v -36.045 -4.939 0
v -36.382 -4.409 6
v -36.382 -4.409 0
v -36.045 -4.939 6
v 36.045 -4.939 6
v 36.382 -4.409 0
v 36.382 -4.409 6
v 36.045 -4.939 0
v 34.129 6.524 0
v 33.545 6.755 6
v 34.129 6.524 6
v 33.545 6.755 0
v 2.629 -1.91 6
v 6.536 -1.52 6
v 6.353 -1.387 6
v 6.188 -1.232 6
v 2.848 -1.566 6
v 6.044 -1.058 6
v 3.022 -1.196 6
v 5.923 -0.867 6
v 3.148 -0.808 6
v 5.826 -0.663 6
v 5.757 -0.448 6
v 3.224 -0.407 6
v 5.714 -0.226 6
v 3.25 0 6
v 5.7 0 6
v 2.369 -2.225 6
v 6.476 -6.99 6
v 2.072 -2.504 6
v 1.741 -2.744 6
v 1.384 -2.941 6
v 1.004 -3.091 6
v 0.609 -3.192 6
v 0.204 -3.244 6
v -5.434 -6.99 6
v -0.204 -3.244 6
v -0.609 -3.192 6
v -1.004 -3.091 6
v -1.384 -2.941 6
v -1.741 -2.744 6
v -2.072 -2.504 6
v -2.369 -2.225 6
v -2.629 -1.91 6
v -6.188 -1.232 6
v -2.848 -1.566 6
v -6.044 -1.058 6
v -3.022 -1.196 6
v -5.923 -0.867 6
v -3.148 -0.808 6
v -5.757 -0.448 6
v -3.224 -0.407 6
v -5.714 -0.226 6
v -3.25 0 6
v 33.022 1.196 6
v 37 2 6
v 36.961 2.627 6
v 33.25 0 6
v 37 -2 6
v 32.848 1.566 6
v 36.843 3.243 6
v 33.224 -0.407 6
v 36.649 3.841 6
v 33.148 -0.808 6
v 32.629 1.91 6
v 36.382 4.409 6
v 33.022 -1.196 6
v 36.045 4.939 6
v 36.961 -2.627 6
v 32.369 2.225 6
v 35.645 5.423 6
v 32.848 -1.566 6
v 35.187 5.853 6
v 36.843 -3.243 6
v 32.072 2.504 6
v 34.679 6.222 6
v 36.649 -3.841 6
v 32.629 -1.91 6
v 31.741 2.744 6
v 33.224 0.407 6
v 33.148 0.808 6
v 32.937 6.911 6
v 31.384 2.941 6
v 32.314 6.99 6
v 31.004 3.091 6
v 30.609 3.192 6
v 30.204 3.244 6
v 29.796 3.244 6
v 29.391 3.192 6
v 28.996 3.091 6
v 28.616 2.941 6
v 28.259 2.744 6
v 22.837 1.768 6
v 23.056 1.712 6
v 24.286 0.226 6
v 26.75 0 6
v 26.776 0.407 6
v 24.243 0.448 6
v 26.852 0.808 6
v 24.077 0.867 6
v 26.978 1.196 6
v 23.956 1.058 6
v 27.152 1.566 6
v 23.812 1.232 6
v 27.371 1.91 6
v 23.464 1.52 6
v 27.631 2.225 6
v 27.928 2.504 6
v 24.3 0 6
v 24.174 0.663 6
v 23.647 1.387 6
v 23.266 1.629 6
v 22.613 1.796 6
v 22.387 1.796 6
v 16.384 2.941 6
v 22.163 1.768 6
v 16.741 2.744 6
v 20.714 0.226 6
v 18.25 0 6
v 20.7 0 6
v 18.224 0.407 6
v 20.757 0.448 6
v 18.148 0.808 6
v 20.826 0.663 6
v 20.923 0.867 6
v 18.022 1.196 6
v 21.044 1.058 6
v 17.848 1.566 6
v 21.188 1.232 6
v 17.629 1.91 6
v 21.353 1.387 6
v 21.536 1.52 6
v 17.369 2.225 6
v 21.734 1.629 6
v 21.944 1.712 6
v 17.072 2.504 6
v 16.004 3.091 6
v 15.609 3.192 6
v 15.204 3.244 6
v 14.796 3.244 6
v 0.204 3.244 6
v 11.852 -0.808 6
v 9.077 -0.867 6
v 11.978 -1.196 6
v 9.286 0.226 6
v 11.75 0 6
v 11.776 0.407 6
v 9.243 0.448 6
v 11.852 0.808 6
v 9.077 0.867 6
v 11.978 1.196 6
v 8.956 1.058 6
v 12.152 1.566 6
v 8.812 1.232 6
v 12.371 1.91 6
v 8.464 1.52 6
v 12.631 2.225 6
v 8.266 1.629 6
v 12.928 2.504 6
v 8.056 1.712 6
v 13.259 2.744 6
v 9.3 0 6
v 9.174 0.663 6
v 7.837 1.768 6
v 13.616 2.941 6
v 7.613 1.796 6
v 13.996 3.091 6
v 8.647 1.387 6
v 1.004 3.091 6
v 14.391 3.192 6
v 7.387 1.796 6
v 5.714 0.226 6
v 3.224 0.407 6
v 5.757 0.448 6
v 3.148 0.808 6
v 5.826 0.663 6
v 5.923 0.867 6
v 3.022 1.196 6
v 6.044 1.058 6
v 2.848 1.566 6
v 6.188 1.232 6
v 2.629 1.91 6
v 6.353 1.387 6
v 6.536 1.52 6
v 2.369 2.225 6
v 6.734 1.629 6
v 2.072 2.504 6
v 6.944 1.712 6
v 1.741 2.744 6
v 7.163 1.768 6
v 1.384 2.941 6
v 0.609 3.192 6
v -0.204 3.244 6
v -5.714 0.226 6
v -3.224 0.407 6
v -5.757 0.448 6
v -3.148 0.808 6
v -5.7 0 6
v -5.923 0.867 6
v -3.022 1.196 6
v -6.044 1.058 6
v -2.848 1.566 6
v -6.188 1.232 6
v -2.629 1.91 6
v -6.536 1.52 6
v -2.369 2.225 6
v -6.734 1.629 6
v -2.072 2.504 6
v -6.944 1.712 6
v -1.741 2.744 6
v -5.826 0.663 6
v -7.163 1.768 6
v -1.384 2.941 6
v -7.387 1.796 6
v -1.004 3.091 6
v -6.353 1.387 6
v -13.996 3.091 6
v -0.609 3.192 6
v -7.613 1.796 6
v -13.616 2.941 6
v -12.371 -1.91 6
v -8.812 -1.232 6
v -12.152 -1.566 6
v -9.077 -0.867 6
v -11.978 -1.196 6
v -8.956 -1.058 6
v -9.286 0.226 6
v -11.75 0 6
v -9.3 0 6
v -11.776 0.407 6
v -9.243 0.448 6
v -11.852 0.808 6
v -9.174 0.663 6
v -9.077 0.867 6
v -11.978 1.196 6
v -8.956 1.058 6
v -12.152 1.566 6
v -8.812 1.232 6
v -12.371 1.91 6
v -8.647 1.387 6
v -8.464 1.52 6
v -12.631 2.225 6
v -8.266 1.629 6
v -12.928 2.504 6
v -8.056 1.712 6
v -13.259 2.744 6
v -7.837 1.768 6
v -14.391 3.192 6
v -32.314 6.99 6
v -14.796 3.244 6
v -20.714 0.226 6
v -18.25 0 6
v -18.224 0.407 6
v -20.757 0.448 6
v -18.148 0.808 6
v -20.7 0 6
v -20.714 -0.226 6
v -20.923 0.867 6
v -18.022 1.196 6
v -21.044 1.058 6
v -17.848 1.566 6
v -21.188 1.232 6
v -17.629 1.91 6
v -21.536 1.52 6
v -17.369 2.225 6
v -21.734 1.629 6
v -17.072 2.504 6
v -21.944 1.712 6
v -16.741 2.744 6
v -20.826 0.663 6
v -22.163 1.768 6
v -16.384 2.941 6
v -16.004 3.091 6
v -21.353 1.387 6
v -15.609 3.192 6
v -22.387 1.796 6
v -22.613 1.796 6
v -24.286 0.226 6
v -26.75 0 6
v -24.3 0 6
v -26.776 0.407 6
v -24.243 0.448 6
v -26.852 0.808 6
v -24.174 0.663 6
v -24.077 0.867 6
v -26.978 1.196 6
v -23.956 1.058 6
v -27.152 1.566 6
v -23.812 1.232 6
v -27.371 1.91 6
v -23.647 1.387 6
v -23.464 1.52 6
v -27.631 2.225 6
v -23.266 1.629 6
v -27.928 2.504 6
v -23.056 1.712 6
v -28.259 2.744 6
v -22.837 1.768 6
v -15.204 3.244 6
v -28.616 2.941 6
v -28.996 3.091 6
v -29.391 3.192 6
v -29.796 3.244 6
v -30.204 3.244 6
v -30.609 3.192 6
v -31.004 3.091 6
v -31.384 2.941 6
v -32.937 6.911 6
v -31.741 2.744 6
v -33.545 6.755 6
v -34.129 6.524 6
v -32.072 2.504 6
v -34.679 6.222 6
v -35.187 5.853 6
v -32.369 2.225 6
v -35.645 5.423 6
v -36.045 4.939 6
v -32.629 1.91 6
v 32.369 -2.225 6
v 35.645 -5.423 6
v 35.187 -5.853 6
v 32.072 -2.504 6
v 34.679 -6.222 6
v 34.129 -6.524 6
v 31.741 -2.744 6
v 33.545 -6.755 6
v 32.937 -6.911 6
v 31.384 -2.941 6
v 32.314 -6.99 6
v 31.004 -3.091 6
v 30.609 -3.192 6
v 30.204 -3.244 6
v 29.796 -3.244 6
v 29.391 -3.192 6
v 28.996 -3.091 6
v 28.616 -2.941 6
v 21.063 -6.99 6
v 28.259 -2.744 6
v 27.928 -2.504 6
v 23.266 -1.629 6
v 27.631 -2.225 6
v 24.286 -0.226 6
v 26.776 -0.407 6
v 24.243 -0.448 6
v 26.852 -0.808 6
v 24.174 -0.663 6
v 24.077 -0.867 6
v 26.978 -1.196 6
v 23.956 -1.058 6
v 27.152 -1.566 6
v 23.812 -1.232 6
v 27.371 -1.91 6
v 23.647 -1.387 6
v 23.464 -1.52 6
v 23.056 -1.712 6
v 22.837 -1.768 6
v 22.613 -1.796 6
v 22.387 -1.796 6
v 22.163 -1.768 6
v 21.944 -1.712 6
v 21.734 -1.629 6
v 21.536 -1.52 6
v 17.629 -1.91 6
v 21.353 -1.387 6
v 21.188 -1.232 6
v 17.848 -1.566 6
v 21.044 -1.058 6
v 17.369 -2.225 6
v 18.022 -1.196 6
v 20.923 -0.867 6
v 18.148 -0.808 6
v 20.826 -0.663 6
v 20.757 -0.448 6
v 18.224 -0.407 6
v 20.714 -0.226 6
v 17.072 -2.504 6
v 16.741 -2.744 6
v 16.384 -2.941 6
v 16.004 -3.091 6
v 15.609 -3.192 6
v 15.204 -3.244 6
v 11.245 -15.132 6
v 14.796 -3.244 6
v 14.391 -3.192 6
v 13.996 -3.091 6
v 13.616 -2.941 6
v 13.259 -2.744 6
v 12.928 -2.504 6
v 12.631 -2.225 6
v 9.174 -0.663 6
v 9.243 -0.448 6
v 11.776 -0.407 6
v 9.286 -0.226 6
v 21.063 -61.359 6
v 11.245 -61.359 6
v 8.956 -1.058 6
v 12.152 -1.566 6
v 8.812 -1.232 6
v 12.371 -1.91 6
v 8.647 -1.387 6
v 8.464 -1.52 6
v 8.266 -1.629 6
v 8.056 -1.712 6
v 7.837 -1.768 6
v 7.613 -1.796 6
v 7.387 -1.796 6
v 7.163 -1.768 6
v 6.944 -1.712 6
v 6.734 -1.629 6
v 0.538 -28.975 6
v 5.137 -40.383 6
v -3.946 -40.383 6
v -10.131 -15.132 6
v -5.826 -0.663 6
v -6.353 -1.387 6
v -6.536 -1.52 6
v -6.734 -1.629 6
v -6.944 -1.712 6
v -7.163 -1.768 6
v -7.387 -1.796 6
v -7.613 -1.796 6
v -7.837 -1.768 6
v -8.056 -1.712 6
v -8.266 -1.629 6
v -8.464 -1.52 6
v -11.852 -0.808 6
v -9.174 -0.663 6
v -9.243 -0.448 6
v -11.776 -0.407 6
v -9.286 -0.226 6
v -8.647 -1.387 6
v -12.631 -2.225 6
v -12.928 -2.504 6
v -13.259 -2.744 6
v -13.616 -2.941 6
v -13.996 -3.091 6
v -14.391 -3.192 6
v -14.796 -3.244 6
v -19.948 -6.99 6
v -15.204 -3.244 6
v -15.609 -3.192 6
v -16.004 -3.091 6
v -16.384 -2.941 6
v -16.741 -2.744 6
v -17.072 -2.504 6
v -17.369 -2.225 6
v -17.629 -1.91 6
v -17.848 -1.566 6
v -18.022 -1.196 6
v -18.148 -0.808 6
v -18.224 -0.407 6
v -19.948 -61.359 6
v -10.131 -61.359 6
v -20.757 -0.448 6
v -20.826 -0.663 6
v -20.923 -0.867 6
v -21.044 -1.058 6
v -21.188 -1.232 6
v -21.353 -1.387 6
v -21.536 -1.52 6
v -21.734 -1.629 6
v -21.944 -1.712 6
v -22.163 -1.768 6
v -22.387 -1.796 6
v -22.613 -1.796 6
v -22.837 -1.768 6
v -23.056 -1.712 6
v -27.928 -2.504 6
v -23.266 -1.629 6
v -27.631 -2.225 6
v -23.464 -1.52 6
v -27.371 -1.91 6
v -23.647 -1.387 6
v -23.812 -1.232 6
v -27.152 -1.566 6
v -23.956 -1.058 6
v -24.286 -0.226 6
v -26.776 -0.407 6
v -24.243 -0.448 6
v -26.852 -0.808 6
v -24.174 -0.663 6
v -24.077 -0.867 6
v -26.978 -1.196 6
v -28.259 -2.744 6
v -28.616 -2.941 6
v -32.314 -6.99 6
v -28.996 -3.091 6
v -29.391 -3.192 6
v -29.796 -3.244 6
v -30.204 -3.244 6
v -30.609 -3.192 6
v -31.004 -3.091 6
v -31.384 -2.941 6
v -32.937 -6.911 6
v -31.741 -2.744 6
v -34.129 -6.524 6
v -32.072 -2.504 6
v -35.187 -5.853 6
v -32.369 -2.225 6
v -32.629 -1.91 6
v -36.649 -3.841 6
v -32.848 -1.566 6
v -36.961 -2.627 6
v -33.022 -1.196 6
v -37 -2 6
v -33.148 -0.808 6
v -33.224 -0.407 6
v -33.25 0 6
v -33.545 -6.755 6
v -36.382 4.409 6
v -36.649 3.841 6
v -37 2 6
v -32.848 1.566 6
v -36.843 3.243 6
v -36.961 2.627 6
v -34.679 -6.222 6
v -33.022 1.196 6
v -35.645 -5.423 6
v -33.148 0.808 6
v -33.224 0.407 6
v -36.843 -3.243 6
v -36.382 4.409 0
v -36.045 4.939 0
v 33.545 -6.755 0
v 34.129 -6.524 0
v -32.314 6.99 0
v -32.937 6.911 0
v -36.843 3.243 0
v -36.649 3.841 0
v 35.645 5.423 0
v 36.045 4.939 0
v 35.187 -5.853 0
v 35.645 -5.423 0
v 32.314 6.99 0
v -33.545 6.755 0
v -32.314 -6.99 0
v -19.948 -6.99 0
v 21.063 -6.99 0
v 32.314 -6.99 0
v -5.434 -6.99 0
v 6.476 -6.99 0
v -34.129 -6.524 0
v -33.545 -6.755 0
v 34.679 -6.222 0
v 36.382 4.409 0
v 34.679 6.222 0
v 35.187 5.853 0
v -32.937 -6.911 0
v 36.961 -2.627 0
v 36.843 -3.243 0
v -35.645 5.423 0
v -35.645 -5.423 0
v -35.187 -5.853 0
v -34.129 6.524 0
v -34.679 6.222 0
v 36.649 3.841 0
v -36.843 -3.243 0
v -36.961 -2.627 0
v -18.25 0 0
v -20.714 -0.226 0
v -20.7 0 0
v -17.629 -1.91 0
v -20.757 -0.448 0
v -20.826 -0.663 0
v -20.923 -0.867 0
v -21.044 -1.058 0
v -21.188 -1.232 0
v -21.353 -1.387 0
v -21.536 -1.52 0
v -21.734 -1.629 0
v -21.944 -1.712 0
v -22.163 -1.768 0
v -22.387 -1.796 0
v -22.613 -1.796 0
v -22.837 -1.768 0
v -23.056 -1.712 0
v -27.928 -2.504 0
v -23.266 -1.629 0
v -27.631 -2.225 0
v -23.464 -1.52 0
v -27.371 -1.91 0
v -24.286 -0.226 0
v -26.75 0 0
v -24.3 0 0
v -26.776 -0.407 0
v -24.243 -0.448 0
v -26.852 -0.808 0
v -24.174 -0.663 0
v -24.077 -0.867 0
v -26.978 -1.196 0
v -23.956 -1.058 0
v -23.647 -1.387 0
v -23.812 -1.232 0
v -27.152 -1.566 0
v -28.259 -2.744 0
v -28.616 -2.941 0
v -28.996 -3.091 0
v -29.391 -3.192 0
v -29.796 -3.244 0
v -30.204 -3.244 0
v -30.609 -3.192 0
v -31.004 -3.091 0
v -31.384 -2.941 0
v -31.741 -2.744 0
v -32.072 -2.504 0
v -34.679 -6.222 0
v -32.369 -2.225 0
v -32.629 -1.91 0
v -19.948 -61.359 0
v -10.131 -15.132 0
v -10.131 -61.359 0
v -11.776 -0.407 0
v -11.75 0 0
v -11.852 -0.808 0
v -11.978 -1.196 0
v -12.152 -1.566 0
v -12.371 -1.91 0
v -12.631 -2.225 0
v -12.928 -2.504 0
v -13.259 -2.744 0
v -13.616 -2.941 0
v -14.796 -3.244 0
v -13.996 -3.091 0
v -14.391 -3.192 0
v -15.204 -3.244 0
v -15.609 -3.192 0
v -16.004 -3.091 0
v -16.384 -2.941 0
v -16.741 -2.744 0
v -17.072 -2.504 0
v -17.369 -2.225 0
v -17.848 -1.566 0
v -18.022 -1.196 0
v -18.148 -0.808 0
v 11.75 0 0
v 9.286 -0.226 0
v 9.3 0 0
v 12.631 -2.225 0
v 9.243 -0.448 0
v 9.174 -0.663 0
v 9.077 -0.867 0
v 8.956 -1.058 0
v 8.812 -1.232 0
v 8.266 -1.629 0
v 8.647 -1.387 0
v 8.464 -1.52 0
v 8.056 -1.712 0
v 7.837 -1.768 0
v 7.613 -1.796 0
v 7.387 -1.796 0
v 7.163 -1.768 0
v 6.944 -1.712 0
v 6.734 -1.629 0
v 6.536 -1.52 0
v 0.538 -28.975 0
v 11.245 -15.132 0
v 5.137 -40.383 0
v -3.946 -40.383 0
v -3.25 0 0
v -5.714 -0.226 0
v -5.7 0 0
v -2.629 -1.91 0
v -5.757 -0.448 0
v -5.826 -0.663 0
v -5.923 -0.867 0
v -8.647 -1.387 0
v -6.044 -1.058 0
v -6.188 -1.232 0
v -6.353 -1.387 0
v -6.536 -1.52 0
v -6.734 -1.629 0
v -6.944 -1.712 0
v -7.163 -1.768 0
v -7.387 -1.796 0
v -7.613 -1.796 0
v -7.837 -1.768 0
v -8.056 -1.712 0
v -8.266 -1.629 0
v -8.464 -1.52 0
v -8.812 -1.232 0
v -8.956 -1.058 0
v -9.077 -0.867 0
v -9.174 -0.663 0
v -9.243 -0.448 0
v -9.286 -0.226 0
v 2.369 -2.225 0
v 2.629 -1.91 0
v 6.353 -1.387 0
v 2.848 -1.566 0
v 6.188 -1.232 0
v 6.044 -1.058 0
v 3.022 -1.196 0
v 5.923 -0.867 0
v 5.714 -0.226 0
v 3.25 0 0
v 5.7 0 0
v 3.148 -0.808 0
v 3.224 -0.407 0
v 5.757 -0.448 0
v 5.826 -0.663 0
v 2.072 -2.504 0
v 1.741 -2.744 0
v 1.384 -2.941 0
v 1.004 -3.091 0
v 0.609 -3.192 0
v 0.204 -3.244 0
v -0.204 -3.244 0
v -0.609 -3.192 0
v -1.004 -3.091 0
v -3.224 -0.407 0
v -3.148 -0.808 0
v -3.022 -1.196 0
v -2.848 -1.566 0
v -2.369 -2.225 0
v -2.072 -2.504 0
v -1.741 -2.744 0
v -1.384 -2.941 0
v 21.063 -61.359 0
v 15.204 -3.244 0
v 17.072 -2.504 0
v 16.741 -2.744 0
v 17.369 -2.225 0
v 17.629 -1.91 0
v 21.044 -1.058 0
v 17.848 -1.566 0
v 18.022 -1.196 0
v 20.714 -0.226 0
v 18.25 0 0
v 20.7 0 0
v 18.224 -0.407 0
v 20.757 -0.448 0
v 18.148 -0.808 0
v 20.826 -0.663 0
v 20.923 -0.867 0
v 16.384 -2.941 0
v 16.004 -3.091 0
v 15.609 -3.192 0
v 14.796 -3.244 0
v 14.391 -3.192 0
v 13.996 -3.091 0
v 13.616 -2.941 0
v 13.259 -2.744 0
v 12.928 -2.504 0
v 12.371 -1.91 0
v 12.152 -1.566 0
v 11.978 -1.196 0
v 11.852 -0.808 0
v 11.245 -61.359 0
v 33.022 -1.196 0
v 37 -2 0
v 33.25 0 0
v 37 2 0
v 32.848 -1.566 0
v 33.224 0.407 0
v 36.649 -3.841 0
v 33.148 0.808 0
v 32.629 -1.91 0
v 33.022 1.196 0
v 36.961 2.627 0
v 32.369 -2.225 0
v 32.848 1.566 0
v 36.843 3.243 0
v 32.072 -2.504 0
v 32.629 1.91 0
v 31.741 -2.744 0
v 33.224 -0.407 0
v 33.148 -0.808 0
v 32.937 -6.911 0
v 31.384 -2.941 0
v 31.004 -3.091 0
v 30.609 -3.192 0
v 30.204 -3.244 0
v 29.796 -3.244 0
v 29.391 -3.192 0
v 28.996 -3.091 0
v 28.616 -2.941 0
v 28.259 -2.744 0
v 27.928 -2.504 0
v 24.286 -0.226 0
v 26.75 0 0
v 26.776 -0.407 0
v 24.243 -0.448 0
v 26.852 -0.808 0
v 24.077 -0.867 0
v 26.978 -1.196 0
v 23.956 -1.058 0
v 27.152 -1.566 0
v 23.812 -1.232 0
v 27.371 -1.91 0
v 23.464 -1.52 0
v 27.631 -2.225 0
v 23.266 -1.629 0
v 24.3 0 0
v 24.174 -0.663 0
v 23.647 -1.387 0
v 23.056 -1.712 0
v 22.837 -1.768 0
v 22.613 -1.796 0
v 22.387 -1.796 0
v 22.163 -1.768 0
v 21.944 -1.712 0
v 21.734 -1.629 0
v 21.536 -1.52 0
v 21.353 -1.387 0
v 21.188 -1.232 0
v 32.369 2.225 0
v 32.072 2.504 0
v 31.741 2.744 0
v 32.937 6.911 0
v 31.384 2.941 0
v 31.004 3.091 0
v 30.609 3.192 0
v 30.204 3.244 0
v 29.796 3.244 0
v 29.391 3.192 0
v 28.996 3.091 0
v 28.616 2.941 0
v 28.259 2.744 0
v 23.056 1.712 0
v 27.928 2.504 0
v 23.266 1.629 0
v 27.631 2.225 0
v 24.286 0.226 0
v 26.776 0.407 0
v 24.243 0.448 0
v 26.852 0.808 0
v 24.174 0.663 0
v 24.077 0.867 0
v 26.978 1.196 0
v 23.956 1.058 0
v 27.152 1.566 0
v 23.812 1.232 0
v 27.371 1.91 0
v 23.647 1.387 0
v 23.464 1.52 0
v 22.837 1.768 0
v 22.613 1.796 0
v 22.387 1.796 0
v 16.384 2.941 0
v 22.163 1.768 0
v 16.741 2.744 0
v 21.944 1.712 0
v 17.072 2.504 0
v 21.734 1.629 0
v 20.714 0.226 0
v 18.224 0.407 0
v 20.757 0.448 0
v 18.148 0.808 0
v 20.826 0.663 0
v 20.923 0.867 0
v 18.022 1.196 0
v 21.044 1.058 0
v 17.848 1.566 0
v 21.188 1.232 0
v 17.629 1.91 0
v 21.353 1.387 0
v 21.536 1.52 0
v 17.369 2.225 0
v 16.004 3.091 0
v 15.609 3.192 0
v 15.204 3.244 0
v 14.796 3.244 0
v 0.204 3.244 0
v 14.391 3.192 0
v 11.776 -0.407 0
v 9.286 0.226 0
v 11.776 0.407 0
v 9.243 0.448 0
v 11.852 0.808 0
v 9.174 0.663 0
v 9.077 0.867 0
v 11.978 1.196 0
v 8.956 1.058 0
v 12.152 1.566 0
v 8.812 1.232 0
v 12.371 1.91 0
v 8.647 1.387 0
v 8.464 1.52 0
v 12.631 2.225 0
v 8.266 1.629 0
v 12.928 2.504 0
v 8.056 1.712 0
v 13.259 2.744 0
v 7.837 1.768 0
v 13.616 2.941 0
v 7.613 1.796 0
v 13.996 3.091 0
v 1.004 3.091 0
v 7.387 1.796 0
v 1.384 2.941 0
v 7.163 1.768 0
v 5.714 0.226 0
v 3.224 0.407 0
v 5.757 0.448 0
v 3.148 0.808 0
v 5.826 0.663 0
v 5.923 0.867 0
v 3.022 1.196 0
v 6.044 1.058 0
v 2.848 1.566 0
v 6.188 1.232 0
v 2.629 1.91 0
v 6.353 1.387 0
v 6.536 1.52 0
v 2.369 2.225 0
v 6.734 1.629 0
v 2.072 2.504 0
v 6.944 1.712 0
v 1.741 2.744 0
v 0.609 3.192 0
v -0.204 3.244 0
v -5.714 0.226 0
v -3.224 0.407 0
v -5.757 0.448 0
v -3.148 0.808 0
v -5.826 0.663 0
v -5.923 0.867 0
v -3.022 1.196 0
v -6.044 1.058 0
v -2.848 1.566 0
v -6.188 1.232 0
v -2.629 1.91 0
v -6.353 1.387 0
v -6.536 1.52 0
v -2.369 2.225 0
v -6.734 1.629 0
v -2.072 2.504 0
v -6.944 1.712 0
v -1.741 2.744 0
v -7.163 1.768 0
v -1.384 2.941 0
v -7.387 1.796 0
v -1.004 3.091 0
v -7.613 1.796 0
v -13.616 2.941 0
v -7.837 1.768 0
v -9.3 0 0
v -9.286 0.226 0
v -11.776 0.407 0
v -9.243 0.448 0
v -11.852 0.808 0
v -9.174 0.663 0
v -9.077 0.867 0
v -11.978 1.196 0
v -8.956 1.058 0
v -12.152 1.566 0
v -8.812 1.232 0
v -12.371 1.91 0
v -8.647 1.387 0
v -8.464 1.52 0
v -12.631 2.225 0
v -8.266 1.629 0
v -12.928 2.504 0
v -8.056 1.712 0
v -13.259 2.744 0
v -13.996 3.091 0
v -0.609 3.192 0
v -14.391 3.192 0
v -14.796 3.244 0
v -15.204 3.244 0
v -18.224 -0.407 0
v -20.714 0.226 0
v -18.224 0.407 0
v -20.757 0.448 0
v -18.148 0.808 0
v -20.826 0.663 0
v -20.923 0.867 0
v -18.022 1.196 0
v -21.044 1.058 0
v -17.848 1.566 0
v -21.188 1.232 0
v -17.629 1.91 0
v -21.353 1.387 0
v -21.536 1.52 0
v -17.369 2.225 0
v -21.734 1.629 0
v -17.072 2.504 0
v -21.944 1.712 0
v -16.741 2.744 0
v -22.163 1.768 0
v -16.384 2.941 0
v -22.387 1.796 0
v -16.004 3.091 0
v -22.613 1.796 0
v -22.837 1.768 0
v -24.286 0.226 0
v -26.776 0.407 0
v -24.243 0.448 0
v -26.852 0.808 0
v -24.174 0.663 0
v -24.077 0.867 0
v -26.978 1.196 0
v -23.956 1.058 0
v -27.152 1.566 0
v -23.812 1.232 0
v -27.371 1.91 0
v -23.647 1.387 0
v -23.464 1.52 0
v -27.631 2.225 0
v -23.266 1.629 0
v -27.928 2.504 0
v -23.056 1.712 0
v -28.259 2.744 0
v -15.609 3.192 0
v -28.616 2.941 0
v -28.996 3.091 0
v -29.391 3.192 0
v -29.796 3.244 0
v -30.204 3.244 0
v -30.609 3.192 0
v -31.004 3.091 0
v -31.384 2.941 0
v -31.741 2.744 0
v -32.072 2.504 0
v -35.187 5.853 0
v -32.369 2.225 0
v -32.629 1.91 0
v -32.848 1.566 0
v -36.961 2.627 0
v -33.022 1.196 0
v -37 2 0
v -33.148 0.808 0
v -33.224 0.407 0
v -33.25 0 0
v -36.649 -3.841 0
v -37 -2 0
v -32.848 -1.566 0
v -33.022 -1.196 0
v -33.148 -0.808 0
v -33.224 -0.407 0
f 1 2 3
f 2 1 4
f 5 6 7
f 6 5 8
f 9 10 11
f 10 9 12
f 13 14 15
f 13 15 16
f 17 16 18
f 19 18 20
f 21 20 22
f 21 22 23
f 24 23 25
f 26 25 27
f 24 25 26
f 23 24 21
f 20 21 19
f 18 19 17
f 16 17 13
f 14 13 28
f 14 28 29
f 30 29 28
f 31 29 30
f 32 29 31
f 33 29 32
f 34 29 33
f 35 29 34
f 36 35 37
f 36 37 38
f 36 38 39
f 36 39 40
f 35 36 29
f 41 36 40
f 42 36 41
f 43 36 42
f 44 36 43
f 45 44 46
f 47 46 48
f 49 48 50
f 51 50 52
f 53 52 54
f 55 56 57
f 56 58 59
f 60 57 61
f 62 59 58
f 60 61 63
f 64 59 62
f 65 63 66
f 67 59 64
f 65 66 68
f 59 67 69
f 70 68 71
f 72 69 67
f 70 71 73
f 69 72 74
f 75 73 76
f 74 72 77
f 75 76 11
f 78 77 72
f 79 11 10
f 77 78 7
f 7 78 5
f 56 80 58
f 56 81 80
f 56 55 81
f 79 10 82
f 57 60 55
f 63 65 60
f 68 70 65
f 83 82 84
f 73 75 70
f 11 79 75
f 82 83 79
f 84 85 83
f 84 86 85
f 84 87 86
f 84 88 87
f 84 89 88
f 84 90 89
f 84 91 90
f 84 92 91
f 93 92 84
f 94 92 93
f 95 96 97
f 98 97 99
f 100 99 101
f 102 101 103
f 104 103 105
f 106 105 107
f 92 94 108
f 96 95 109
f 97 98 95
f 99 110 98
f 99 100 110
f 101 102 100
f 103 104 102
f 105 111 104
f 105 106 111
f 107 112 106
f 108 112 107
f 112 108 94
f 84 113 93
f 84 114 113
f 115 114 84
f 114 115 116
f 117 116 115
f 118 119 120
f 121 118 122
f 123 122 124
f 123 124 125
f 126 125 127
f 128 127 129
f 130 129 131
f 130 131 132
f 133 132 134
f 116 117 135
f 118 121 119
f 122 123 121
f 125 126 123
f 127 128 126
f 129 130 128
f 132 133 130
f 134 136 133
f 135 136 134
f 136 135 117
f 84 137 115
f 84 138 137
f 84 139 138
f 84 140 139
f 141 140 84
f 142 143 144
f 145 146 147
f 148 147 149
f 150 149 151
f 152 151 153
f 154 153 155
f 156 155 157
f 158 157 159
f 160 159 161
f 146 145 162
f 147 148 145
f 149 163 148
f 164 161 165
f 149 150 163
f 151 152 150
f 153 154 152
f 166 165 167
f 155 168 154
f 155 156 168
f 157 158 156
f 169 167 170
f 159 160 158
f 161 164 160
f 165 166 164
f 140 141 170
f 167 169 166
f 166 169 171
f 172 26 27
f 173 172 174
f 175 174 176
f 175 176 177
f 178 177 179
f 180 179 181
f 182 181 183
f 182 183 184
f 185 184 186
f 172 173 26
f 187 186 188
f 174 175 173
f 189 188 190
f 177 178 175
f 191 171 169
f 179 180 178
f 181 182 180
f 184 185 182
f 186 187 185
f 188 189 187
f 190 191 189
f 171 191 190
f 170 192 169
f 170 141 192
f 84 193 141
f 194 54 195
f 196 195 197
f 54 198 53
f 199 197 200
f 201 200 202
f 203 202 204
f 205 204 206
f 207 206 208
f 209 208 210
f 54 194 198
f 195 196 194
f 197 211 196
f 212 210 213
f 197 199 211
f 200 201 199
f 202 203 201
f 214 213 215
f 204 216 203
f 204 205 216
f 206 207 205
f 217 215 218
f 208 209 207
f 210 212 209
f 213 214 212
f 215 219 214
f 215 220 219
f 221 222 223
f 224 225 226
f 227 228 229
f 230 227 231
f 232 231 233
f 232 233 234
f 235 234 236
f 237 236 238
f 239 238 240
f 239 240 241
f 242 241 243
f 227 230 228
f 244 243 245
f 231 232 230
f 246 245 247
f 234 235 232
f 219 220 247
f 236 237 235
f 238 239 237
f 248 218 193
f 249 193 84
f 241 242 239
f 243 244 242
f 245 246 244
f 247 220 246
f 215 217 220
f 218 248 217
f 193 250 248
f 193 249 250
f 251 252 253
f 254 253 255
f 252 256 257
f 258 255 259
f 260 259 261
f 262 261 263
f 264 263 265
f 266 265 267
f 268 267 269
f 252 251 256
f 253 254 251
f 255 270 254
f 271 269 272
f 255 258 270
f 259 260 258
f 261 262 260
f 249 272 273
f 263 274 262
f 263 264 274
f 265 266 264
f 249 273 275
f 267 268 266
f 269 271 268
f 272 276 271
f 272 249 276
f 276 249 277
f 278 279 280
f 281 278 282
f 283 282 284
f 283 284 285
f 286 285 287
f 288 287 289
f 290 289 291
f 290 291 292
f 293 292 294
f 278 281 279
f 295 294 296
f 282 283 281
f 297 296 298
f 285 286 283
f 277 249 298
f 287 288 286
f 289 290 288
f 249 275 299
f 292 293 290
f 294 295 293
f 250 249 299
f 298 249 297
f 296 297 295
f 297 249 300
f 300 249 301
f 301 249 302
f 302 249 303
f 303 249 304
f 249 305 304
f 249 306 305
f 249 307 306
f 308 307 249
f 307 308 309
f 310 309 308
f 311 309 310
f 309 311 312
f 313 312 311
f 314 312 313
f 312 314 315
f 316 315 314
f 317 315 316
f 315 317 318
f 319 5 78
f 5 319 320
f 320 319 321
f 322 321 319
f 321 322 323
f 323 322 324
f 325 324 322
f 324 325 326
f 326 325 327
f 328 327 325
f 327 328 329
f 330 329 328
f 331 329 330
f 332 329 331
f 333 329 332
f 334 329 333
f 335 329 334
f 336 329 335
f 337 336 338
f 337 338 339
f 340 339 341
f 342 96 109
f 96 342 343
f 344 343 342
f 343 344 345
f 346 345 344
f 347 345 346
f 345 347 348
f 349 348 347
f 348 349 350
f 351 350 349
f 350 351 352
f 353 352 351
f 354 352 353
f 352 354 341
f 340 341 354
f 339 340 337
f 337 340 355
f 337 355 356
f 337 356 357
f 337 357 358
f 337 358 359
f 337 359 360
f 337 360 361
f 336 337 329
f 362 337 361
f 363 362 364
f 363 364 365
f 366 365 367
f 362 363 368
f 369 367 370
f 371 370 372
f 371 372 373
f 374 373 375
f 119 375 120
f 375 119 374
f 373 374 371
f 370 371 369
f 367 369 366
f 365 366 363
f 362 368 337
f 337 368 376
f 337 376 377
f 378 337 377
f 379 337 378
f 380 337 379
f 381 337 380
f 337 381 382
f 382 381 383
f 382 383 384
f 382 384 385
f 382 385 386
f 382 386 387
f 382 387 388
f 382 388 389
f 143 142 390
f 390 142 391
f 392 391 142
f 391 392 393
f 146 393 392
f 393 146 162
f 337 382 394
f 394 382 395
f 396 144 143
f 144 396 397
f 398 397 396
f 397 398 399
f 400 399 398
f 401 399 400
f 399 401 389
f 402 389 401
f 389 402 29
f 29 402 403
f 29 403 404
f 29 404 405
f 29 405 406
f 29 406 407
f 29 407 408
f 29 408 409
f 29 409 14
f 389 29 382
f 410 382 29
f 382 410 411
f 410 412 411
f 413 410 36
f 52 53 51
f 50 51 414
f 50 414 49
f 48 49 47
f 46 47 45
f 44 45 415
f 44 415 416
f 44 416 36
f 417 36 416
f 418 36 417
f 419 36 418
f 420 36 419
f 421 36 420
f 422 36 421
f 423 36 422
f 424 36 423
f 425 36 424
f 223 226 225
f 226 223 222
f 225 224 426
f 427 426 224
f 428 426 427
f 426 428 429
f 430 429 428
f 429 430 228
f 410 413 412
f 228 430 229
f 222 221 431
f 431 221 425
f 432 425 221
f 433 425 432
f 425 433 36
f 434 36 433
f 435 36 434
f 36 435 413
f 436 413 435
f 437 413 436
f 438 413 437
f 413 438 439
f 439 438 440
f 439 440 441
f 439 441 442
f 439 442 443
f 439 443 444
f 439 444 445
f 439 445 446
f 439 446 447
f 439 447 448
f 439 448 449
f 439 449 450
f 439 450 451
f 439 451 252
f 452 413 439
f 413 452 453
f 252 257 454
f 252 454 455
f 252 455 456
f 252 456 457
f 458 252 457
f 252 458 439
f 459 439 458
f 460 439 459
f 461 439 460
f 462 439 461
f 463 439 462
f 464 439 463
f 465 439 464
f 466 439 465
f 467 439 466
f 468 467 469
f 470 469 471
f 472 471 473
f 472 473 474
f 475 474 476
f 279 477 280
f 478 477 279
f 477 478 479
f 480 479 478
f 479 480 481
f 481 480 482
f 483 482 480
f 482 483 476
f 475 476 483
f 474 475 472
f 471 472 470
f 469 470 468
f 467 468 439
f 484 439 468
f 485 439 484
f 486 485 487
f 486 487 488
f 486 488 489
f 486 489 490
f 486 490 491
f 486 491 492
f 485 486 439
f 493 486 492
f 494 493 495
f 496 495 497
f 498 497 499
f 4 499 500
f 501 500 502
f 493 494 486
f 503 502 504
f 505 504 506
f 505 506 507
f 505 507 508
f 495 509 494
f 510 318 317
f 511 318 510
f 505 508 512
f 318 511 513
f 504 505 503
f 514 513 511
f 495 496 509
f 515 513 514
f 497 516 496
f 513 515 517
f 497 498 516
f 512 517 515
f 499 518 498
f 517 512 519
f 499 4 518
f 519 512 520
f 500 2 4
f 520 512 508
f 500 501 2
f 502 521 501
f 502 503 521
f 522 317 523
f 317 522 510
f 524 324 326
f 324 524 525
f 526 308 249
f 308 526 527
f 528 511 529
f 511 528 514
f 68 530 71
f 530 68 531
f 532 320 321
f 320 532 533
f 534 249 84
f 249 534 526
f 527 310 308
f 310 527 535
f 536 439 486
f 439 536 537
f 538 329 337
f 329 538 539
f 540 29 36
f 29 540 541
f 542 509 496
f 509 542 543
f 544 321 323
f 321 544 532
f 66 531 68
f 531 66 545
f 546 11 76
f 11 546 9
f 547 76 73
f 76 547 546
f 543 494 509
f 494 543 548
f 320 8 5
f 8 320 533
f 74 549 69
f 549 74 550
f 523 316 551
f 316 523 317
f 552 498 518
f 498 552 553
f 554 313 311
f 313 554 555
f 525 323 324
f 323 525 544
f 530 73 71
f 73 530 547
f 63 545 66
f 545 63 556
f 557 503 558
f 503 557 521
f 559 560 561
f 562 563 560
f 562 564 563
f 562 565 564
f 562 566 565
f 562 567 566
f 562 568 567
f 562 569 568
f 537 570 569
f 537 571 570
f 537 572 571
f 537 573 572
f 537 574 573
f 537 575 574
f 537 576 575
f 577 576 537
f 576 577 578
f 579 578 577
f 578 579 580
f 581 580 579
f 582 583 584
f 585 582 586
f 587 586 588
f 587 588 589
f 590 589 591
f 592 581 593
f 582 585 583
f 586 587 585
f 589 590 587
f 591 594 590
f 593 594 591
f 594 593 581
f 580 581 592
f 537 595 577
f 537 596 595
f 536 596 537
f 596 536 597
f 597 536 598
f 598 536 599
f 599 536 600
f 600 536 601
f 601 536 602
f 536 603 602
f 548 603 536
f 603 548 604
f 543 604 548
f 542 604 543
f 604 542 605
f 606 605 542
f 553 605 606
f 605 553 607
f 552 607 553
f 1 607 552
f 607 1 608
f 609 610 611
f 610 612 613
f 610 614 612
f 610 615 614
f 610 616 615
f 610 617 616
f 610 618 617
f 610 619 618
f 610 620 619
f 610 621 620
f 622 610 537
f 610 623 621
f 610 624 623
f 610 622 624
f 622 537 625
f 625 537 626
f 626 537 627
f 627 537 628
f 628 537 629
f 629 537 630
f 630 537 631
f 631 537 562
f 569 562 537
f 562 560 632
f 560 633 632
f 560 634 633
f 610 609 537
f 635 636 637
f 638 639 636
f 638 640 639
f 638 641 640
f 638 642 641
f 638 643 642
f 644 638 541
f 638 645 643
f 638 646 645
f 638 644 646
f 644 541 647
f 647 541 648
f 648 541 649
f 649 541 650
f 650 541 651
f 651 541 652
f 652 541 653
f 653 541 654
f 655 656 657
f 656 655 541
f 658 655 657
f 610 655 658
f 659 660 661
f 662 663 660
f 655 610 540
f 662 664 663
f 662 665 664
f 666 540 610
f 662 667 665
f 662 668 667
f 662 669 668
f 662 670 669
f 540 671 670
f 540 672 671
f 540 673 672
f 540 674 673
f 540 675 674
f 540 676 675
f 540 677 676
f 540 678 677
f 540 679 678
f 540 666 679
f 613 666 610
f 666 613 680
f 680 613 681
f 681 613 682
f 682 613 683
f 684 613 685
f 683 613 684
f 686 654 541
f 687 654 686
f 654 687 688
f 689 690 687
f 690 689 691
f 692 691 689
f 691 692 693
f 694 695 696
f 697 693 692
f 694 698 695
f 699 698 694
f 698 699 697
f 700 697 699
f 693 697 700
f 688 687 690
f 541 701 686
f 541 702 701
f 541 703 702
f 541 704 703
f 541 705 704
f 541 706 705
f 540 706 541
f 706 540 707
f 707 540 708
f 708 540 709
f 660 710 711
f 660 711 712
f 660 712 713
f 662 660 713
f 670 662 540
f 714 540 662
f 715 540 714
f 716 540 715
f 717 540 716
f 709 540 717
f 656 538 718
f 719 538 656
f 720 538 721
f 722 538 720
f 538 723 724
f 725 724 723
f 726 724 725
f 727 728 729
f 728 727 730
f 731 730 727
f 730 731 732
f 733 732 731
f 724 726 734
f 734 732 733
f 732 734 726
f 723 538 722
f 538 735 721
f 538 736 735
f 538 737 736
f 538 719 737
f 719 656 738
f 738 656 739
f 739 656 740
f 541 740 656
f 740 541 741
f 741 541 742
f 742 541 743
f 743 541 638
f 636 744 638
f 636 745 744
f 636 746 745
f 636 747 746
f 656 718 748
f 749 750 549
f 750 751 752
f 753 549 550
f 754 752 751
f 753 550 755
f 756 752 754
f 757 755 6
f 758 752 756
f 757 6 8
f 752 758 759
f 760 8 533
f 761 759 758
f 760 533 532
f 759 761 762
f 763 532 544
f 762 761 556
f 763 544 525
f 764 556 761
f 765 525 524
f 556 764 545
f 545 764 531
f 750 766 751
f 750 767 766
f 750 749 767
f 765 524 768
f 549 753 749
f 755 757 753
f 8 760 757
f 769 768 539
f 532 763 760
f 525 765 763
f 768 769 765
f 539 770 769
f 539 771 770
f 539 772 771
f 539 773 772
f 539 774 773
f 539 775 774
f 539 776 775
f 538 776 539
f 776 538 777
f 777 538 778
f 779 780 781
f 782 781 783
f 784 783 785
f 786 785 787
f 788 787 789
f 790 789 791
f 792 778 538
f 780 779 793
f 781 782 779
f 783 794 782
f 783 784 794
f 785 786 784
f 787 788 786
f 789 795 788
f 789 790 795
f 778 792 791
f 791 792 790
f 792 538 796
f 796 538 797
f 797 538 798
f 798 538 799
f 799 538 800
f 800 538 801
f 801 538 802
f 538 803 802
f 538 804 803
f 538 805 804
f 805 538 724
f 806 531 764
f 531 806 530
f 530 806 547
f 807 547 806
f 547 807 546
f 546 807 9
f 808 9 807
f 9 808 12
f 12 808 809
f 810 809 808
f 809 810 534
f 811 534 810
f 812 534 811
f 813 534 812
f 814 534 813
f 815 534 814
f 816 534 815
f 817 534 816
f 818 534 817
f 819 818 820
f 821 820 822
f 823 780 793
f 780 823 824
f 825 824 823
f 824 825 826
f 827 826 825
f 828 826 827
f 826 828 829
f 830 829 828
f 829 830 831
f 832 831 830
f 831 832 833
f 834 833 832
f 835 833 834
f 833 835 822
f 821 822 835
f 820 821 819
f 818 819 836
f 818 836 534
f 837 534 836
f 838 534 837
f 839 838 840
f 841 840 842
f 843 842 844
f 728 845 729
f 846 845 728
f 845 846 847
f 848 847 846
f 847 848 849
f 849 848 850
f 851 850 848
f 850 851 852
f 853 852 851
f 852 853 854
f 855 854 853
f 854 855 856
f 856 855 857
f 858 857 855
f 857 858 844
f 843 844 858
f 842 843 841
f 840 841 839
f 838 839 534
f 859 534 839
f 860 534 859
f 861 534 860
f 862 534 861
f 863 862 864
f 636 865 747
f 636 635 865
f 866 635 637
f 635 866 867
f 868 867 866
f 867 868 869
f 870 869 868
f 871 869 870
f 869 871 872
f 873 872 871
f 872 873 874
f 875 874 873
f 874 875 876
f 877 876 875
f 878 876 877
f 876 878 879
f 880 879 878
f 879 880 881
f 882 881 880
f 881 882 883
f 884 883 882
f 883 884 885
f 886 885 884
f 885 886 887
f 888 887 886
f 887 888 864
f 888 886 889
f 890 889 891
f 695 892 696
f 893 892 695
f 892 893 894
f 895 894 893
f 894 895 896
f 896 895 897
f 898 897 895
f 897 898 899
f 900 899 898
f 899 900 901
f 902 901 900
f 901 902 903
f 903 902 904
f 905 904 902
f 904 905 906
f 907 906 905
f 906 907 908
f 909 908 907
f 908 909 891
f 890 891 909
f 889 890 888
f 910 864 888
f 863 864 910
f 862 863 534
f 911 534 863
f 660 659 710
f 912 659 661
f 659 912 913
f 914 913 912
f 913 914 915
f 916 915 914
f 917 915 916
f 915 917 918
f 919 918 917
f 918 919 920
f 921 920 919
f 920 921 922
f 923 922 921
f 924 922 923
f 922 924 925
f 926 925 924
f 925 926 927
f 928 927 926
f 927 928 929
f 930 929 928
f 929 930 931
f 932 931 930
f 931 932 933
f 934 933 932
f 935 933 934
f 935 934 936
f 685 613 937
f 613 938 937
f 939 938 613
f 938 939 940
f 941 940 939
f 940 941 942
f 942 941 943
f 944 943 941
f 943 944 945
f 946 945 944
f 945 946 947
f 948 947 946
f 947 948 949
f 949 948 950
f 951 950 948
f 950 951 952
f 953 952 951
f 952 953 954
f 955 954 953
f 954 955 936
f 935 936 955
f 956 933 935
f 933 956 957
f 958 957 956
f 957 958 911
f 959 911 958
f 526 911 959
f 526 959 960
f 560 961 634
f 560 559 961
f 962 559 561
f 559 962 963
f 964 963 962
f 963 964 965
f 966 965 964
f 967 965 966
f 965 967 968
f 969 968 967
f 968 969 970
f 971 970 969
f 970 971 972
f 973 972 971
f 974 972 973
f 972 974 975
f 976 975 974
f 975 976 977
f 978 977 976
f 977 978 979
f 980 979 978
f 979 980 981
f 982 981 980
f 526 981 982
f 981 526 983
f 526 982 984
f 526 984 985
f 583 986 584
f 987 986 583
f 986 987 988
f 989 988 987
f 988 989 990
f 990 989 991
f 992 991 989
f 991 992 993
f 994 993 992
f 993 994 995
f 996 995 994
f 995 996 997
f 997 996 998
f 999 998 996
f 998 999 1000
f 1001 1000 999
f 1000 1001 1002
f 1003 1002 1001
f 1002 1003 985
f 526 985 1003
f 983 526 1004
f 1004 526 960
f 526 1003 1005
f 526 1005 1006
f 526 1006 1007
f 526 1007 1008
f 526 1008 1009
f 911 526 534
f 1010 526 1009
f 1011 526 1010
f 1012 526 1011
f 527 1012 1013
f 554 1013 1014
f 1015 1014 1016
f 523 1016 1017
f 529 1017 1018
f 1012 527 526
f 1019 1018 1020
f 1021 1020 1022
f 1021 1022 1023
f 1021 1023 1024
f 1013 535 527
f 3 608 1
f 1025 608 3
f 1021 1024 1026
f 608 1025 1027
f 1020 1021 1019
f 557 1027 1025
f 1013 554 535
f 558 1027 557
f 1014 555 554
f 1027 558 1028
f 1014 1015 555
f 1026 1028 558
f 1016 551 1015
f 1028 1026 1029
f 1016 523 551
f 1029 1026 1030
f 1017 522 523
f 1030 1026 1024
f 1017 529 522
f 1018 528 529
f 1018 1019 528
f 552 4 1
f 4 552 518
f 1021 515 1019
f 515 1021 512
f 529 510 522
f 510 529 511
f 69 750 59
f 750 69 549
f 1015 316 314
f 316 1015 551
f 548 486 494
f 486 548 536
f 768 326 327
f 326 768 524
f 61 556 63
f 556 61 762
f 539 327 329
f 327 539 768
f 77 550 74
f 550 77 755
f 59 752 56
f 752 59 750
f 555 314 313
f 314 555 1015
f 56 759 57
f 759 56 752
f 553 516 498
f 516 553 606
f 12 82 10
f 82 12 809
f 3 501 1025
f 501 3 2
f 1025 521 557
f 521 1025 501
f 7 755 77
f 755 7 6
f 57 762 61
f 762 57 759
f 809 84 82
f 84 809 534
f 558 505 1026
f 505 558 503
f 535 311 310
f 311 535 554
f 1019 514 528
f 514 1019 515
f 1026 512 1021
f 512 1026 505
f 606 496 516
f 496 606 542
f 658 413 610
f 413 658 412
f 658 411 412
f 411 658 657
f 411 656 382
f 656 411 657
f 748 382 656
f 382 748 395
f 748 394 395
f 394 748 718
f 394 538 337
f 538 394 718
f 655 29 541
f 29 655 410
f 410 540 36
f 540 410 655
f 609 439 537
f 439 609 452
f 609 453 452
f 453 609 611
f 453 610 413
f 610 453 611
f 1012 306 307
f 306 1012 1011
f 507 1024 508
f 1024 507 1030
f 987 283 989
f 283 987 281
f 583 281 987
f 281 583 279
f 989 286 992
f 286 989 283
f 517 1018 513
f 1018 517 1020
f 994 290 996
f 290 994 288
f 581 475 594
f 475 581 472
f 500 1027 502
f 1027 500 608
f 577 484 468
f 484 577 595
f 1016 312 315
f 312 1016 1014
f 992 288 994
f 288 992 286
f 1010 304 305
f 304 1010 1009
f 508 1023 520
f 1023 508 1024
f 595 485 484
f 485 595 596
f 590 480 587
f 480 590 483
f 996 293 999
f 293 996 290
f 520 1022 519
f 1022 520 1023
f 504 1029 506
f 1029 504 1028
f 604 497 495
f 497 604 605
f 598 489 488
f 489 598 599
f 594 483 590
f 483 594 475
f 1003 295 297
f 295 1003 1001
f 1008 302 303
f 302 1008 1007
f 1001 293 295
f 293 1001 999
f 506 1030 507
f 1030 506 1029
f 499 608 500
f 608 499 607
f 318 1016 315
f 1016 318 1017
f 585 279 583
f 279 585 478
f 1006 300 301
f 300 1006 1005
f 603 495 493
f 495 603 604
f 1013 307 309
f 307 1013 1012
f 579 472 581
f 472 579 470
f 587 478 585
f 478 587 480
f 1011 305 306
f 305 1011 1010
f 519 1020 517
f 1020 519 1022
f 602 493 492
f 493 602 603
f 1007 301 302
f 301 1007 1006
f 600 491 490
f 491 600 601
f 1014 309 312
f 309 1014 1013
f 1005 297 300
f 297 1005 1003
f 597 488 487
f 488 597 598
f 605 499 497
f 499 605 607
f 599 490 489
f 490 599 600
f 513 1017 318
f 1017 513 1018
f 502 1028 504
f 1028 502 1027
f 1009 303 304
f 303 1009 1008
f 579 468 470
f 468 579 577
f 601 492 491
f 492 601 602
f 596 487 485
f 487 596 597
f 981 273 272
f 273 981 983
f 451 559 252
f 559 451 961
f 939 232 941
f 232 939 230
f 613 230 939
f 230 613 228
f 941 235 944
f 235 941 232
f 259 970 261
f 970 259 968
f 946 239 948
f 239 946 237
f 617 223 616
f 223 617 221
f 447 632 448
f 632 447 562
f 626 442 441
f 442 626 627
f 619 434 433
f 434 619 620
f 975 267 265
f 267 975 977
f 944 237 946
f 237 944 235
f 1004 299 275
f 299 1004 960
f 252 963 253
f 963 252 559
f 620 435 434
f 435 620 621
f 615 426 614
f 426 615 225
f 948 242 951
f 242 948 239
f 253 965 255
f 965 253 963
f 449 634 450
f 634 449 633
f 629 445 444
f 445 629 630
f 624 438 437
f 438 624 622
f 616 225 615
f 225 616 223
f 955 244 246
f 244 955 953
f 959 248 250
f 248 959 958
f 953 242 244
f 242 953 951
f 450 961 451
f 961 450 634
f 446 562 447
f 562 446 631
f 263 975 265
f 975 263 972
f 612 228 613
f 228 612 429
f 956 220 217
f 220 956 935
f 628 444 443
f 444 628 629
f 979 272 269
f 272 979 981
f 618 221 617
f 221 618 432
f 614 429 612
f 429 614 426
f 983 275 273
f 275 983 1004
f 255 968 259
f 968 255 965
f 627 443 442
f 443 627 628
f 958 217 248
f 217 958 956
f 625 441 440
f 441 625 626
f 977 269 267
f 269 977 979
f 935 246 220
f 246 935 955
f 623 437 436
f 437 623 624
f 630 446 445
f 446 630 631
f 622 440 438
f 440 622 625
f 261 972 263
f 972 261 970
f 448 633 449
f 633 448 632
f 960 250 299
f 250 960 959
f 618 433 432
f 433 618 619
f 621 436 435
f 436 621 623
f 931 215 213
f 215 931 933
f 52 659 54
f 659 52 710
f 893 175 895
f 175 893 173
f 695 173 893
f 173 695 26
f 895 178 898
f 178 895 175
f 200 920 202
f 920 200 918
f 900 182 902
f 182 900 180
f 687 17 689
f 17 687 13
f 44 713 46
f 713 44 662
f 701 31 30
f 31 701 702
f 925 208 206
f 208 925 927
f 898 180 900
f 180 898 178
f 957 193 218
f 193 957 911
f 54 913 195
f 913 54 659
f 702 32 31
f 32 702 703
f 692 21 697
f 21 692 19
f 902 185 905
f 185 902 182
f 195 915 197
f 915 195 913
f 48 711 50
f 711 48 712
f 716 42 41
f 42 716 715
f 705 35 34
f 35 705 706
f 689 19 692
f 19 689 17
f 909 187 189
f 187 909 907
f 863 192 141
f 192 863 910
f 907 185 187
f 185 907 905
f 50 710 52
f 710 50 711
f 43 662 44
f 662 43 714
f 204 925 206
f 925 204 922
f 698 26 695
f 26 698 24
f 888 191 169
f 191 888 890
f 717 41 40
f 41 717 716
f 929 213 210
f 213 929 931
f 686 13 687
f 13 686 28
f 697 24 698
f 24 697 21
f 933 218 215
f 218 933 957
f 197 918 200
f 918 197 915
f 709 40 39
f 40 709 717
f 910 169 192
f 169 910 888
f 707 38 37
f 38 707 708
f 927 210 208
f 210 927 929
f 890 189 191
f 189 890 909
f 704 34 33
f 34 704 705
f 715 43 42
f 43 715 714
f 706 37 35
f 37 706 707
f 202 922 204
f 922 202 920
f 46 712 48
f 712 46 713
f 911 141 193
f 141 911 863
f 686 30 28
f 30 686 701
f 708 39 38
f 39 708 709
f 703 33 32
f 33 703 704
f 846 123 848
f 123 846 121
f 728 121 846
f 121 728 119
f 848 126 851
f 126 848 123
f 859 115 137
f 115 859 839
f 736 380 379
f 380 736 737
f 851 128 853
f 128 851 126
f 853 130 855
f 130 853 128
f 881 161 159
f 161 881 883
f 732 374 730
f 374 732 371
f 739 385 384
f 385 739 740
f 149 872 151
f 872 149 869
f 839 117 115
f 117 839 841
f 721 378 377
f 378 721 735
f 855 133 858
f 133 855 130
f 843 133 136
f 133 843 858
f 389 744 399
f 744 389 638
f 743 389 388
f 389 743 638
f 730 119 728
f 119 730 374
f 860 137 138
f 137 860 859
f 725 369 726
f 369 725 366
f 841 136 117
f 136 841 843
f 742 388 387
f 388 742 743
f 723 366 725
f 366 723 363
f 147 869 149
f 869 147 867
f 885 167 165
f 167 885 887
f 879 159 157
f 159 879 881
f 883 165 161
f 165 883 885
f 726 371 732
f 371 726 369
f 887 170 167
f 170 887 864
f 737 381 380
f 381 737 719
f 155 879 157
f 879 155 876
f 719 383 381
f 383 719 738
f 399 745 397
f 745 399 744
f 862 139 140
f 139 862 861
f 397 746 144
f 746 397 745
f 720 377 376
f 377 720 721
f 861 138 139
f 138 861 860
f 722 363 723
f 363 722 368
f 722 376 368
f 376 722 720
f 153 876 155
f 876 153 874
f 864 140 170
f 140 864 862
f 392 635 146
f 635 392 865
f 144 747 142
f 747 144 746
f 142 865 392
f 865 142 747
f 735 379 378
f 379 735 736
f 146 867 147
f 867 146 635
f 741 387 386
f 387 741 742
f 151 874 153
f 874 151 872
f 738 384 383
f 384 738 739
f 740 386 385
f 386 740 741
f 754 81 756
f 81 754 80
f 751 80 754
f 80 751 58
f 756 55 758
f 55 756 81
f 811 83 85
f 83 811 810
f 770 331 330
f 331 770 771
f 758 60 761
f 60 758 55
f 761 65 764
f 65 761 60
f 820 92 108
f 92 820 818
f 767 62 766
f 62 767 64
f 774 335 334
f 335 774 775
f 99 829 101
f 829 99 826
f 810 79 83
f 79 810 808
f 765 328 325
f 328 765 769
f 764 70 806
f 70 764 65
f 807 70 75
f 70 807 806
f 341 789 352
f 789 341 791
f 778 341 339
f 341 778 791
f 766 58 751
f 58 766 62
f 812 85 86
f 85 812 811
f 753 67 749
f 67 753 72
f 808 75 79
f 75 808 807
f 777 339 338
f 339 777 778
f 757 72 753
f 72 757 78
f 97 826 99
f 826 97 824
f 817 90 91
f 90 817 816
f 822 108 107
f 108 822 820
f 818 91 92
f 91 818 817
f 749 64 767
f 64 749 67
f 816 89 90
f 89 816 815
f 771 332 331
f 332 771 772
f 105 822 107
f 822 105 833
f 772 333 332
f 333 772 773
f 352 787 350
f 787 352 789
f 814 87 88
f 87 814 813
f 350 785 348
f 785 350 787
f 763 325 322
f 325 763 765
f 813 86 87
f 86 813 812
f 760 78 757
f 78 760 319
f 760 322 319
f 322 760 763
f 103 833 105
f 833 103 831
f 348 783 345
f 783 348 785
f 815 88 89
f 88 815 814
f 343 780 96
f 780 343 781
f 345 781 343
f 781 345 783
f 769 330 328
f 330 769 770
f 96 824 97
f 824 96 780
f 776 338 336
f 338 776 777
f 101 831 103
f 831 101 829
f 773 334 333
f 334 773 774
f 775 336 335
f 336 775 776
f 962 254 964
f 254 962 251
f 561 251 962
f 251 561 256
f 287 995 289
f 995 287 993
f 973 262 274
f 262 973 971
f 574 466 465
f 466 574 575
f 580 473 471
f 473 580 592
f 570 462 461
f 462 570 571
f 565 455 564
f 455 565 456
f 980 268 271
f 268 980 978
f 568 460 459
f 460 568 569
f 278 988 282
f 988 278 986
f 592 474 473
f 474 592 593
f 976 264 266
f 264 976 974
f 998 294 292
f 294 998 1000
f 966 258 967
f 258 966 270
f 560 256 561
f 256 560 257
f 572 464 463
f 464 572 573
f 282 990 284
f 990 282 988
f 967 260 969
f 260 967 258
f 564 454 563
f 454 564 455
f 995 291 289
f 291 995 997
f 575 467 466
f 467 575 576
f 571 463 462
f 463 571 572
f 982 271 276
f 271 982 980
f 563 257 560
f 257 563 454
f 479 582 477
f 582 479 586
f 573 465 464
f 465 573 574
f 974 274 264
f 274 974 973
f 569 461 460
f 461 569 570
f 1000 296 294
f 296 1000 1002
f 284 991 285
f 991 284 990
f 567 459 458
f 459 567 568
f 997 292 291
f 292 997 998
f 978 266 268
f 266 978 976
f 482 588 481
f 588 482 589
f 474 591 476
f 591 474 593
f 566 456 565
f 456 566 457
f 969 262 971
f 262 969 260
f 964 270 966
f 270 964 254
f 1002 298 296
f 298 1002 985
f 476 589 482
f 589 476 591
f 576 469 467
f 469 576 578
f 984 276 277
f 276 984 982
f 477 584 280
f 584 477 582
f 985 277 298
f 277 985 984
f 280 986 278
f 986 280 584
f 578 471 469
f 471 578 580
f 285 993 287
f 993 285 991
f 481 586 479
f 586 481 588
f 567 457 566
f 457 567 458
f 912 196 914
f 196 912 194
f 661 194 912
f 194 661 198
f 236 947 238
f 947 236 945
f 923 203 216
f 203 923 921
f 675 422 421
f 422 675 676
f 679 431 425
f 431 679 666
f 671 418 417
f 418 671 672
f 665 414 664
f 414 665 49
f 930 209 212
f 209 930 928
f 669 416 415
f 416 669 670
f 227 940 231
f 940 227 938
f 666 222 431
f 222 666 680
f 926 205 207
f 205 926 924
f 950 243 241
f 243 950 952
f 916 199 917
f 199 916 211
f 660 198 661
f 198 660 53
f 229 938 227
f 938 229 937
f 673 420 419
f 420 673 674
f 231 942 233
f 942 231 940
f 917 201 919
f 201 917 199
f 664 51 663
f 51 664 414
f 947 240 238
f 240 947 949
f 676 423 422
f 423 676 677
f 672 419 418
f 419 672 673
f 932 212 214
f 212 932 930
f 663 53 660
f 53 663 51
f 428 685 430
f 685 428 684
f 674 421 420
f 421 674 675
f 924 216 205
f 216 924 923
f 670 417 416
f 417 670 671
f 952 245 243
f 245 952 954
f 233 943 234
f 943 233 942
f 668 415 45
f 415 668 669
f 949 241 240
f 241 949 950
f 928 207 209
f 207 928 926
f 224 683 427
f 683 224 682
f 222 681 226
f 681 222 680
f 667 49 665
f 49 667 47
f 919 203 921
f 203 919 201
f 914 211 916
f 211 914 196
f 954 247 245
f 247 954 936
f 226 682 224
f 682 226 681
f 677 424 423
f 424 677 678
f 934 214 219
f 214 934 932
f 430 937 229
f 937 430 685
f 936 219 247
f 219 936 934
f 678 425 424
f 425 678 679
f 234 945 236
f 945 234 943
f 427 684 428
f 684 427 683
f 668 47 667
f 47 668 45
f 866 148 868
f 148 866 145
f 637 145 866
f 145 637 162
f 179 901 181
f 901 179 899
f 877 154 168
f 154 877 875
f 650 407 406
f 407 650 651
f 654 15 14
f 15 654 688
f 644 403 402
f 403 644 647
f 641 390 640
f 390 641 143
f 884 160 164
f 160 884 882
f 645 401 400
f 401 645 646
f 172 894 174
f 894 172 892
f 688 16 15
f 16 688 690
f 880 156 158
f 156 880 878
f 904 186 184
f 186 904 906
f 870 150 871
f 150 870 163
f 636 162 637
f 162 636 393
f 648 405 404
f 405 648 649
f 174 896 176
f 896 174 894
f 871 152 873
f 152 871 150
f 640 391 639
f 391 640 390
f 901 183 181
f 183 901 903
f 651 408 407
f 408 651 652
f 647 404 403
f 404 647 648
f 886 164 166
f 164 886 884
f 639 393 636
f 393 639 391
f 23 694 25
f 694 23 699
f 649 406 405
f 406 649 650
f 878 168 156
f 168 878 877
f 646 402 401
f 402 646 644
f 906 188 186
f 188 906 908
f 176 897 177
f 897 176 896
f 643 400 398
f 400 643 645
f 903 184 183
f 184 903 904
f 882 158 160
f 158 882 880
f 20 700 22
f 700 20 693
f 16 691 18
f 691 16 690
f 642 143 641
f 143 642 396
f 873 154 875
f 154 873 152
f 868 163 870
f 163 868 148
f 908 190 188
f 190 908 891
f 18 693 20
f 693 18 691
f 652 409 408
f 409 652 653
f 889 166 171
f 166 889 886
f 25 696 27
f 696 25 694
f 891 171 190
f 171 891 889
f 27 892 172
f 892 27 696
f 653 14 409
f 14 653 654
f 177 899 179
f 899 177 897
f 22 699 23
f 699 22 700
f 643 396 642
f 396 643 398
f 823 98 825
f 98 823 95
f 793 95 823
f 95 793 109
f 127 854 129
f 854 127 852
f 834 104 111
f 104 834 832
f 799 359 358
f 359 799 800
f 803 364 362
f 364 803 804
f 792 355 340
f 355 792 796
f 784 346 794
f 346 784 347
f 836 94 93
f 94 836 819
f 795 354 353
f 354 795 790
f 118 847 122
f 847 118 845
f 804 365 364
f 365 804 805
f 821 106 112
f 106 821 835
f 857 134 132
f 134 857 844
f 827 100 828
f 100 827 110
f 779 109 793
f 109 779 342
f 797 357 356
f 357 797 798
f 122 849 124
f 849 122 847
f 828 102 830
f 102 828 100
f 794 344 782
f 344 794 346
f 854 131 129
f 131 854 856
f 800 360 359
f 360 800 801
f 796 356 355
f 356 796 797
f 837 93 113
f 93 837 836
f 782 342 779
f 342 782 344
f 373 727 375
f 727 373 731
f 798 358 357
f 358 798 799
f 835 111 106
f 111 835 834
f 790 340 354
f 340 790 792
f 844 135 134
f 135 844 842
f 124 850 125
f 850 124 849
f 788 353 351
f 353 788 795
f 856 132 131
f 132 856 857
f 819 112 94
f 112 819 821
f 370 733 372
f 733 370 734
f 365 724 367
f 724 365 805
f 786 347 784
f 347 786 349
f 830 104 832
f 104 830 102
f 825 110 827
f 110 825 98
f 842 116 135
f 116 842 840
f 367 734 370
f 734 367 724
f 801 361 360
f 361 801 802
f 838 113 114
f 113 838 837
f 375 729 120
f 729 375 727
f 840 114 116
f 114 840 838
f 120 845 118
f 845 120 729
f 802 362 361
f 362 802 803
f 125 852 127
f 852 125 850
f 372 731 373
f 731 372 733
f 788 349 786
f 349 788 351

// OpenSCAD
$fn = 50;


difference() {
	union() {
		hull() {
			translate(v = [-32.0000000000, 2.0000000000, 0]) {
				cylinder(h = 6, r = 5);
			}
			translate(v = [32.0000000000, 2.0000000000, 0]) {
				cylinder(h = 6, r = 5);
			}
			translate(v = [-32.0000000000, -2.0000000000, 0]) {
				cylinder(h = 6, r = 5);
			}
			translate(v = [32.0000000000, -2.0000000000, 0]) {
				cylinder(h = 6, r = 5);
			}
		}
		translate(v = [0, -5, 0]) {
			linear_extrude(height = 6) {
				text(font = "DejaVu Sans Mono:style=Bold", halign = "center", size = 57.0000000000, text = "M", valign = "top");
			}
		}
	}
	union() {
		translate(v = [-30.0000000000, 0.0000000000, 0]) {
			translate(v = [0, 0, -100]) {
				cylinder(h = 200, r = 3.2500000000);
			}
		}
		translate(v = [-15.0000000000, 0.0000000000, 0]) {
			translate(v = [0, 0, -100]) {
				cylinder(h = 200, r = 3.2500000000);
			}
		}
		translate(v = [0, 0, -100]) {
			cylinder(h = 200, r = 3.2500000000);
		}
		translate(v = [15.0000000000, 0.0000000000, 0]) {
			translate(v = [0, 0, -100]) {
				cylinder(h = 200, r = 3.2500000000);
			}
		}
		translate(v = [30.0000000000, 0.0000000000, 0]) {
			translate(v = [0, 0, -100]) {
				cylinder(h = 200, r = 3.2500000000);
			}
		}
		translate(v = [-30.0000000000, 0.0000000000, 0]) {
			translate(v = [0, 0, -100]) {
				cylinder(h = 200, r = 1.8000000000);
			}
		}
		translate(v = [-22.5000000000, 0.0000000000, 0]) {
			translate(v = [0, 0, -100]) {
				cylinder(h = 200, r = 1.8000000000);
			}
		}
		translate(v = [-15.0000000000, 0.0000000000, 0]) {
			translate(v = [0, 0, -100]) {
				cylinder(h = 200, r = 1.8000000000);
			}
		}
		translate(v = [-7.5000000000, 0.0000000000, 0]) {
			translate(v = [0, 0, -100]) {
				cylinder(h = 200, r = 1.8000000000);
			}
		}
		translate(v = [0, 0, -100]) {
			cylinder(h = 200, r = 1.8000000000);
		}
		translate(v = [7.5000000000, 0.0000000000, 0]) {
			translate(v = [0, 0, -100]) {
				cylinder(h = 200, r = 1.8000000000);
			}
		}
		translate(v = [15.0000000000, 0.0000000000, 0]) {
			translate(v = [0, 0, -100]) {
				cylinder(h = 200, r = 1.8000000000);
			}
		}
		translate(v = [22.5000000000, 0.0000000000, 0]) {
			translate(v = [0, 0, -100]) {
				cylinder(h = 200, r = 1.8000000000);
			}
		}
		translate(v = [30.0000000000, 0.0000000000, 0]) {
			translate(v = [0, 0, -100]) {
				cylinder(h = 200, r = 1.8000000000);
			}
		}
	}
}
